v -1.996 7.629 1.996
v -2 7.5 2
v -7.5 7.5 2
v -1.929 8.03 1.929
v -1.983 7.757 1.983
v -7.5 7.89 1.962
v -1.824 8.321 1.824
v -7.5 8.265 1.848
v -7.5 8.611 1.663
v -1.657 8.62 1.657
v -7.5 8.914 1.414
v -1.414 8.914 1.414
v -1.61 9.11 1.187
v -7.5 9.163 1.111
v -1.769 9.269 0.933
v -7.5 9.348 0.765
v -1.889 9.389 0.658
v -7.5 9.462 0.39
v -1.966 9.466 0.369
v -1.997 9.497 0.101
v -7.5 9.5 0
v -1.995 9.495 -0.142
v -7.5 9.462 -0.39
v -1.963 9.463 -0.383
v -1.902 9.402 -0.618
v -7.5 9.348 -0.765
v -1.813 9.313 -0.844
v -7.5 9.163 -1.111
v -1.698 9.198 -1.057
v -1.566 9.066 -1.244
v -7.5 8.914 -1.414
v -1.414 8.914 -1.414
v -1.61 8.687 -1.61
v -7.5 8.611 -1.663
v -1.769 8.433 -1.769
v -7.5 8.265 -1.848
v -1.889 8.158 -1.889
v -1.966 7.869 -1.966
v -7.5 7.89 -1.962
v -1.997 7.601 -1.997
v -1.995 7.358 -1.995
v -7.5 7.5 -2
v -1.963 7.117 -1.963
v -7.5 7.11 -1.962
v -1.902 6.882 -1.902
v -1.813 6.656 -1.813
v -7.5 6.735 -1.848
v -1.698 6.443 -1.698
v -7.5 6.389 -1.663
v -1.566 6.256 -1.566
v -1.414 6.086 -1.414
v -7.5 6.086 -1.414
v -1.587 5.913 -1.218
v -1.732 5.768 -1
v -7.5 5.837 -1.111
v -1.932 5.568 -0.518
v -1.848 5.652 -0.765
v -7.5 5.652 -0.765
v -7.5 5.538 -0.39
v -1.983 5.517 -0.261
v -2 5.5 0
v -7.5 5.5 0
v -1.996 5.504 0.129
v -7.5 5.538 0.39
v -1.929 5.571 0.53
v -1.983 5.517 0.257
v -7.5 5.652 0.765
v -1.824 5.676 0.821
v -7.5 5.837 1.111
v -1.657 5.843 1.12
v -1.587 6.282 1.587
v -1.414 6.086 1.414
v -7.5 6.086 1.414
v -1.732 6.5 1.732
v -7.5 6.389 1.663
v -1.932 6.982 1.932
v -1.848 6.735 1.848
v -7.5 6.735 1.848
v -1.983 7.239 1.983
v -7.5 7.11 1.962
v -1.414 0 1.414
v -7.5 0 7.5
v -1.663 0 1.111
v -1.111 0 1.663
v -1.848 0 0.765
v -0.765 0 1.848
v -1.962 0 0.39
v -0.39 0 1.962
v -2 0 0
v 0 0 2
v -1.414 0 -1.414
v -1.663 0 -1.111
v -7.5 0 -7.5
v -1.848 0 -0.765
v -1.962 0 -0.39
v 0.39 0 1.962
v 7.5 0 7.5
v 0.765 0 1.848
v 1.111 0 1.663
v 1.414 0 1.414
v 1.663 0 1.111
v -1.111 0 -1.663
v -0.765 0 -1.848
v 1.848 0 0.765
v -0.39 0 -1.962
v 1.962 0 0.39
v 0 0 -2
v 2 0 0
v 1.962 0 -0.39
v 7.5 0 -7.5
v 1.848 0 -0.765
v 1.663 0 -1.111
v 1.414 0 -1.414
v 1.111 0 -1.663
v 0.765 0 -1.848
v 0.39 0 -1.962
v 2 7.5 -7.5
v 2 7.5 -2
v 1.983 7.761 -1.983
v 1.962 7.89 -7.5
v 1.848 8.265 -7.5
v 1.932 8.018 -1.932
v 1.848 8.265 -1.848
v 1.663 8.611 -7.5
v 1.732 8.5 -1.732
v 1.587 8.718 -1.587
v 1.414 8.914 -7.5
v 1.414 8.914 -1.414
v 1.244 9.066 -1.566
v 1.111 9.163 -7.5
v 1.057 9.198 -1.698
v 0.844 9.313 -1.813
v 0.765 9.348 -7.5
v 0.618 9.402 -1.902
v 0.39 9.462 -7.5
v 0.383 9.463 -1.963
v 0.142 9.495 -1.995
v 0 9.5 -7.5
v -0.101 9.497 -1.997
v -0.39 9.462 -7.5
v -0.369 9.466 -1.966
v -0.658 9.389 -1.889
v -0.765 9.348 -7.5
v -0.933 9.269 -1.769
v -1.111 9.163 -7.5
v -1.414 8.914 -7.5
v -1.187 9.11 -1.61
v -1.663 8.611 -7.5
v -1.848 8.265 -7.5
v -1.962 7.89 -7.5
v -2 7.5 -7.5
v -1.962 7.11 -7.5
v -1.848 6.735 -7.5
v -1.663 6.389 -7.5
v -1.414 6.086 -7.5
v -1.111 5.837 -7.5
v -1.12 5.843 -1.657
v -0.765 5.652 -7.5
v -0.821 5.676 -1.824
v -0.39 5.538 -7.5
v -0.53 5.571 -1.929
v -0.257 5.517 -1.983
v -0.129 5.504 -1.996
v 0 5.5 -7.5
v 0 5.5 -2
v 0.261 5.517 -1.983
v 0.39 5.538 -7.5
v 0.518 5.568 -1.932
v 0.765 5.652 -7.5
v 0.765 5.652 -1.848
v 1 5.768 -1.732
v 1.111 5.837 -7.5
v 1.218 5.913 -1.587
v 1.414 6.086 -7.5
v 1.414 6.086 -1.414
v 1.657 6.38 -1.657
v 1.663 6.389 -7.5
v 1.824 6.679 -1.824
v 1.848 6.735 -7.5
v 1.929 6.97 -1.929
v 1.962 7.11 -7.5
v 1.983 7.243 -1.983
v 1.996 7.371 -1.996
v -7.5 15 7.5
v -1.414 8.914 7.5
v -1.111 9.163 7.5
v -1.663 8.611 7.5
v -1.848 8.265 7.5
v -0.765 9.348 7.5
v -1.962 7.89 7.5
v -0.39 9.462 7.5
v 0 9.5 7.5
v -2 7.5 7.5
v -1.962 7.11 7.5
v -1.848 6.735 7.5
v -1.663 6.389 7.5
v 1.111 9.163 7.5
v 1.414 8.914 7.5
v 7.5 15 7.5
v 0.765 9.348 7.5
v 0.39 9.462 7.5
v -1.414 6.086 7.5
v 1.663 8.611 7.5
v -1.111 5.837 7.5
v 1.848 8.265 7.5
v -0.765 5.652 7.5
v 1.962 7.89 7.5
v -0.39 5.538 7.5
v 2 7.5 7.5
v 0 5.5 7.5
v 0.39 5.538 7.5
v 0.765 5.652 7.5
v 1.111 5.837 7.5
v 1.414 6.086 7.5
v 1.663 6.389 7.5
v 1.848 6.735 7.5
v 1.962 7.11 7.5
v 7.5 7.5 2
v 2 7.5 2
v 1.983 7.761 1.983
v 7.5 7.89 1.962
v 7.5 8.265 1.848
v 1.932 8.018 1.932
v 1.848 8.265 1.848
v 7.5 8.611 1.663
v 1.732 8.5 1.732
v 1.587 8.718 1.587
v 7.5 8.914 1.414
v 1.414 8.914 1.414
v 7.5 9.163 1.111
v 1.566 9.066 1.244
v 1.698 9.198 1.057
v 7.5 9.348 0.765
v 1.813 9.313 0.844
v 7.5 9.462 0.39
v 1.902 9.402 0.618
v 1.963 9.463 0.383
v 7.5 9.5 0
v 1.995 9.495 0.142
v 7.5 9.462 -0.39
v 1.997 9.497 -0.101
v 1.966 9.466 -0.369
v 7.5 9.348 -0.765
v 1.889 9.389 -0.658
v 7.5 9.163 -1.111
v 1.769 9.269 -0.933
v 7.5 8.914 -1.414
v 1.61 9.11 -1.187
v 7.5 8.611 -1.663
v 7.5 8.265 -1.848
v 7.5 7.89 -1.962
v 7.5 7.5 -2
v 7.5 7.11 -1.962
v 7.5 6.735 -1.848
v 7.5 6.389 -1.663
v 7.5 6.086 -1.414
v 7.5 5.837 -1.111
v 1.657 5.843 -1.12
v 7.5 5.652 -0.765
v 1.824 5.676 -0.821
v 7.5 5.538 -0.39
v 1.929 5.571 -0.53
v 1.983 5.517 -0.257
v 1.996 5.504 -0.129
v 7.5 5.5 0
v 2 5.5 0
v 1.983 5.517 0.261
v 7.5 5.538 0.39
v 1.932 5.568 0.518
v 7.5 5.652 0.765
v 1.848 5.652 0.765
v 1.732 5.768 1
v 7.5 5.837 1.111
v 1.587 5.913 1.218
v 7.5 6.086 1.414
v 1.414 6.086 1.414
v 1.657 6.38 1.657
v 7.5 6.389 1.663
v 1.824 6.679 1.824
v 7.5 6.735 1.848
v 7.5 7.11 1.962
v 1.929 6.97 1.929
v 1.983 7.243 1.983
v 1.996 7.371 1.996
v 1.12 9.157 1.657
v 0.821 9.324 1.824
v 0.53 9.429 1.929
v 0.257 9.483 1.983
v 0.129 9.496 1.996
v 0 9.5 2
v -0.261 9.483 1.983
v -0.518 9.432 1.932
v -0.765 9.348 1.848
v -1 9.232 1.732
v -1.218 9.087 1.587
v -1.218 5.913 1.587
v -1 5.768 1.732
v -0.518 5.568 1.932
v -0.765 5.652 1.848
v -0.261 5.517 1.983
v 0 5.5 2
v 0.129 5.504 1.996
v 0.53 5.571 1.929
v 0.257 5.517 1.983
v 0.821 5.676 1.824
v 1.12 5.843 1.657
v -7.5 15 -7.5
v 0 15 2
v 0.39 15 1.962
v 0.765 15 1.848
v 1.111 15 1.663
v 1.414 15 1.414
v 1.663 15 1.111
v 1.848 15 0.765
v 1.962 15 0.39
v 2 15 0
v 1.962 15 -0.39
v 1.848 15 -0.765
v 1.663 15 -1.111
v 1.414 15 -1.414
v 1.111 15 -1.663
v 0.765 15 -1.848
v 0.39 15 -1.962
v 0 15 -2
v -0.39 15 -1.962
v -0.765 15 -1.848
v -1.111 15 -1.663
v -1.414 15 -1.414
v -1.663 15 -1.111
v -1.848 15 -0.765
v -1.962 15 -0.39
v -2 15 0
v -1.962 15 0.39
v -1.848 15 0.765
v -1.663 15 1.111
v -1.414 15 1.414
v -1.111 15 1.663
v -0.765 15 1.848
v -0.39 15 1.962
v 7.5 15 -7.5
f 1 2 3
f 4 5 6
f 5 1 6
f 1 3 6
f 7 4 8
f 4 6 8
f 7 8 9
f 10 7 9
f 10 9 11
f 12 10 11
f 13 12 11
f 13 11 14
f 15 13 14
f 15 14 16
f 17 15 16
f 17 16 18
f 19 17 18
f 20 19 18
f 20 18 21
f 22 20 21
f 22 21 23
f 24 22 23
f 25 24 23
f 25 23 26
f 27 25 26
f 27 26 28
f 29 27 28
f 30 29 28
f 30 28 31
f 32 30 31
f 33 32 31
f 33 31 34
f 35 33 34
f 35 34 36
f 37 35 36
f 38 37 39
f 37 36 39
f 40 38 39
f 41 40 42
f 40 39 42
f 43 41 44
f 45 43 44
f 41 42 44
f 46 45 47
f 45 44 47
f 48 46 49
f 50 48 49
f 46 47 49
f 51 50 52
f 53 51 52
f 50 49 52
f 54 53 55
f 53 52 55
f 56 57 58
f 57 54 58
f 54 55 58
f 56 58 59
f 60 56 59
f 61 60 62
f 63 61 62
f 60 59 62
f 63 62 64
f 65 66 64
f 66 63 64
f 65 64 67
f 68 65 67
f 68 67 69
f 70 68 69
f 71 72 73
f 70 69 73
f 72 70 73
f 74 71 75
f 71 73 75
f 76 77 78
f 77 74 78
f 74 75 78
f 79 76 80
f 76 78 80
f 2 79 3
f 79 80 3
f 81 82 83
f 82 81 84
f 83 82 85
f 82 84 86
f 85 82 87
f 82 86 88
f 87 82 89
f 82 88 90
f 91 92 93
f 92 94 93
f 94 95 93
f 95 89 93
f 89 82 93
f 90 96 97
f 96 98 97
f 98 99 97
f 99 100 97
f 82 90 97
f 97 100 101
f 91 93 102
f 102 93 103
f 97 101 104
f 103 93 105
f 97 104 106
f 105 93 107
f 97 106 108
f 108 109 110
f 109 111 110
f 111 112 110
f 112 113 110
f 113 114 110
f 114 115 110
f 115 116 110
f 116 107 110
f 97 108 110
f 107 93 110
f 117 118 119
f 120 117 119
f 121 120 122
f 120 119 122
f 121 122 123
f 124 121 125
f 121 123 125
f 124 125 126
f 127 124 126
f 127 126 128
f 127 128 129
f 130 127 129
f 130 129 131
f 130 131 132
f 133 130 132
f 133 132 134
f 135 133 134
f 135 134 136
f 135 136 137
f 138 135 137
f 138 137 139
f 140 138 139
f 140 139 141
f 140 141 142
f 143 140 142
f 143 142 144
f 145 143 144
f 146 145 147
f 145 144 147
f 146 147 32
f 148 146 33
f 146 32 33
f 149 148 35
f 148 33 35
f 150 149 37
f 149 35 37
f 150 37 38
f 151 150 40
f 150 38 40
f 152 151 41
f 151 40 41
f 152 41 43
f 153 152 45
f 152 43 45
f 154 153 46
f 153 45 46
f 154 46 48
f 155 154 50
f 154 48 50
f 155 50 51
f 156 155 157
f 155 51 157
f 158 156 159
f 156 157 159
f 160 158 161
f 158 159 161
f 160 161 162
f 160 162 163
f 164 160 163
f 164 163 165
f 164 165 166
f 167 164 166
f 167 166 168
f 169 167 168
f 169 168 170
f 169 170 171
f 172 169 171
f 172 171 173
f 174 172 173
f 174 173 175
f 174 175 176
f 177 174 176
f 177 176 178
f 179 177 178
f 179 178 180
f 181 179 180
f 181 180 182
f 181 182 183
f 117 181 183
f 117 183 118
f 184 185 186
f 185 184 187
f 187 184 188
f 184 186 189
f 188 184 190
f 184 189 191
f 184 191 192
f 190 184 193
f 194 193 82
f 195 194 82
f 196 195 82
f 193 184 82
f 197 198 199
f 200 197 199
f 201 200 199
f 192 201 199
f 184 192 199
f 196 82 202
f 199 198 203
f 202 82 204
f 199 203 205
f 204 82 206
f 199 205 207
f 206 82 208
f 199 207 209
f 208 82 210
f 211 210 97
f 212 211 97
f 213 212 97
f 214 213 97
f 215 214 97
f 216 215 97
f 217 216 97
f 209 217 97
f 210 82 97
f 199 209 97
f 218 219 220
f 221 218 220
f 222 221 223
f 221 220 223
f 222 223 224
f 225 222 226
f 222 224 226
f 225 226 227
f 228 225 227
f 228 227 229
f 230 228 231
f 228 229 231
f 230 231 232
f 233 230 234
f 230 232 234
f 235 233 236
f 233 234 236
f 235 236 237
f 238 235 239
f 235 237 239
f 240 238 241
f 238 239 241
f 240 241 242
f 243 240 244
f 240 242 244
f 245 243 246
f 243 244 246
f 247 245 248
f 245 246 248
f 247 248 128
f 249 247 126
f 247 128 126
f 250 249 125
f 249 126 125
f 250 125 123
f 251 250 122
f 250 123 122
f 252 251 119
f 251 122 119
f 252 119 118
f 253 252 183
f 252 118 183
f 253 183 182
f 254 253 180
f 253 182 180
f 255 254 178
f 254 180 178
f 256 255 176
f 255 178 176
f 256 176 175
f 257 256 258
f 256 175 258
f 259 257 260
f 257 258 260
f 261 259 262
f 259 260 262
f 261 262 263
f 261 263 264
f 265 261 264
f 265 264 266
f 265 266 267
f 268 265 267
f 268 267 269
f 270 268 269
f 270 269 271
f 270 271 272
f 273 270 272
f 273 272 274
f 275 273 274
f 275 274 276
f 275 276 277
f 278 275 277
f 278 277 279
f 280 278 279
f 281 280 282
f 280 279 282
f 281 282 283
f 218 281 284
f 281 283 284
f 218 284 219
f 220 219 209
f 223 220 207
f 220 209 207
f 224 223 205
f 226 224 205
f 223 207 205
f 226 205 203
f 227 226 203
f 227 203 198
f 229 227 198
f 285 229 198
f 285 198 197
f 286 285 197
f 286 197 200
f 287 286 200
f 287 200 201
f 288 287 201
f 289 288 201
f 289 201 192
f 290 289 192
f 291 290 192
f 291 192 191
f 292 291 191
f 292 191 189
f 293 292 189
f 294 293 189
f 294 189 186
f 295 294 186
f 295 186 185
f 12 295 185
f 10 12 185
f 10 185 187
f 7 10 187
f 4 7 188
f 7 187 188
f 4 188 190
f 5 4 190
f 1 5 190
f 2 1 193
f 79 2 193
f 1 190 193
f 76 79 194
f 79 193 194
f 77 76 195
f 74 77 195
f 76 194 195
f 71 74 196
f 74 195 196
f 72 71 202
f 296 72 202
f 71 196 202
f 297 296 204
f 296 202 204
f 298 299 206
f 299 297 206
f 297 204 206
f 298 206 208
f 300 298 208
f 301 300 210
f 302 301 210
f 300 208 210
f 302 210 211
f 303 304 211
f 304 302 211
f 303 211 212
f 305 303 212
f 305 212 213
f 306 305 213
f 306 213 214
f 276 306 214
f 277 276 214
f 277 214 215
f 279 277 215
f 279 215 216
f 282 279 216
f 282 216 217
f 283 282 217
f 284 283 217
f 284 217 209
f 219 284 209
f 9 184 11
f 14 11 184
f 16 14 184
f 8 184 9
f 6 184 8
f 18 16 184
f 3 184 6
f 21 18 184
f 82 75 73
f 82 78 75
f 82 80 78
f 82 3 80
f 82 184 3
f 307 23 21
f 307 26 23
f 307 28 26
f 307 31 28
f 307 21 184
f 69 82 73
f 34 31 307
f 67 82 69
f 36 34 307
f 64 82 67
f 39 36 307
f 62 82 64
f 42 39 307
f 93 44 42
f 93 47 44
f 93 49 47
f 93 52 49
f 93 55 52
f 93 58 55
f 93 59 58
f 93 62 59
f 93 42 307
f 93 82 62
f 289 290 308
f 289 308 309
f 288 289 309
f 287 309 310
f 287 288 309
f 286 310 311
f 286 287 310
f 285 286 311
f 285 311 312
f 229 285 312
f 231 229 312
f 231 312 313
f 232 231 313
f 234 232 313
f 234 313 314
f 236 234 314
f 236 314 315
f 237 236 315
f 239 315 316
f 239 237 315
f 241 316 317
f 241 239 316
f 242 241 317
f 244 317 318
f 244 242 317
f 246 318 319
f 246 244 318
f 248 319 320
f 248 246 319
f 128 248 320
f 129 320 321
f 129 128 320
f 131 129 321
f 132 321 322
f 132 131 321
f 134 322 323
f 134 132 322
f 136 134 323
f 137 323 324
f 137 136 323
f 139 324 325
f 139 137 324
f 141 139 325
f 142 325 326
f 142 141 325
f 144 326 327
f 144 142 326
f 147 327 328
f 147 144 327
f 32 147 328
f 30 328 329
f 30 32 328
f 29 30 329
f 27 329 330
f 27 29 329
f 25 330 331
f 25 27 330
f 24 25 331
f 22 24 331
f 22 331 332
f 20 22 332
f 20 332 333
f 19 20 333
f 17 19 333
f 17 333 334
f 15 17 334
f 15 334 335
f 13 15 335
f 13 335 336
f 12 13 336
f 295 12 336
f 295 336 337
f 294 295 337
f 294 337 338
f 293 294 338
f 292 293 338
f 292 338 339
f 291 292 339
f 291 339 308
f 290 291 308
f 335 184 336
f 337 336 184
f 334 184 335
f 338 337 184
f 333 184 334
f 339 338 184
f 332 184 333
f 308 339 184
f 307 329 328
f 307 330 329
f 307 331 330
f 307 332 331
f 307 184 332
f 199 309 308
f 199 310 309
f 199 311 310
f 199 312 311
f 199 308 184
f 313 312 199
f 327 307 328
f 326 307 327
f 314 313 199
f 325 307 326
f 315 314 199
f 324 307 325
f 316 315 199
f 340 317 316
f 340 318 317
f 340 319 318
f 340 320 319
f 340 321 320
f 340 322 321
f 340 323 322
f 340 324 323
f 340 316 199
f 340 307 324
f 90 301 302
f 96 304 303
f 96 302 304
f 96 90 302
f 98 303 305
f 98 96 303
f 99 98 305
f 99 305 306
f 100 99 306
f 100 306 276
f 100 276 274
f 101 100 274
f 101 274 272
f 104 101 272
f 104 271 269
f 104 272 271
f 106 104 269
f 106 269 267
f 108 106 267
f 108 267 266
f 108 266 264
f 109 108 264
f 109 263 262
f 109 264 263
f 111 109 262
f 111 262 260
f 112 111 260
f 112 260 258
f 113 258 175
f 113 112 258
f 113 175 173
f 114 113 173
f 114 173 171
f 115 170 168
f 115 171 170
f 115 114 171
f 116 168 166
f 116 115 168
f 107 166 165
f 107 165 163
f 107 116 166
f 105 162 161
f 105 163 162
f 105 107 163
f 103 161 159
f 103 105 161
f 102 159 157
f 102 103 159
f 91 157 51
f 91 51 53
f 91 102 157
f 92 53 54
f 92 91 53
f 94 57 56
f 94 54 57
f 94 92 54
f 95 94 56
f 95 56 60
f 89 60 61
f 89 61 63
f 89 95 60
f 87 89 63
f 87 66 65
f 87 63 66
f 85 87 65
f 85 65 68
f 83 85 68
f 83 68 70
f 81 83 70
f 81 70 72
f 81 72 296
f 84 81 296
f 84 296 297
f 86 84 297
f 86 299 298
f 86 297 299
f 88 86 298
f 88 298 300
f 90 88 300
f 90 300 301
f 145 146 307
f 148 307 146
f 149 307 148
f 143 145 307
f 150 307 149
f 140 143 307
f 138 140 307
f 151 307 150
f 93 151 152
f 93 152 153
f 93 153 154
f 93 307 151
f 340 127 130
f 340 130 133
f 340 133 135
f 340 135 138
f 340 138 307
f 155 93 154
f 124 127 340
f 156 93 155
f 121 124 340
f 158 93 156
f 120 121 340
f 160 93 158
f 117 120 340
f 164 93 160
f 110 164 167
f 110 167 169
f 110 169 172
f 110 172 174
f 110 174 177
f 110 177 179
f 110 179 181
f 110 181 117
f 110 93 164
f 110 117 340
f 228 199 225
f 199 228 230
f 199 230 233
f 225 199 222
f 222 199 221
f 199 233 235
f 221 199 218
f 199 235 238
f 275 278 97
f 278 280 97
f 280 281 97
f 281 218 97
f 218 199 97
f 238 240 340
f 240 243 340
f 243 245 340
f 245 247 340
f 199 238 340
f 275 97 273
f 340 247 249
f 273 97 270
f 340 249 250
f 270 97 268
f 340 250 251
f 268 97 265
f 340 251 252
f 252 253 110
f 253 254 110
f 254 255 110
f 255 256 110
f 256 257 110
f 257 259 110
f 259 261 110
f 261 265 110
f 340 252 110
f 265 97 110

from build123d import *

# Parameters (mm, degrees)
SKETCH_1_W          = 15
SKETCH_1_H          = 15
SKETCH_1_R          = 2
EXTRUDE_1_DEPTH     = 15
SKETCH_2_R          = 2
CUT_EXTRUDE_1_DEPTH = 15
SKETCH_3_R          = 2
CUT_EXTRUDE_2_DEPTH = 15


with BuildPart() as part:
    # 草图1 → 凸台-拉伸1 (new body)
    with BuildSketch(Plane(origin=(0, 0, 0), x_dir=(1, 0, 0), z_dir=(0, 1, 0))):
        Rectangle(SKETCH_1_W, SKETCH_1_H)
        with Locations(Location((0, 0, 0), (0, 0, 270))):
            Circle(SKETCH_1_R, mode=Mode.SUBTRACT)
    extrude(amount=EXTRUDE_1_DEPTH)

    # 草图2 → 切除-拉伸1 (cut)
    with BuildSketch(Plane.XY.offset(7.5)):
        with Locations((0, 7.5)):
            Circle(SKETCH_2_R)
    extrude(amount=-CUT_EXTRUDE_1_DEPTH, mode=Mode.SUBTRACT)

    # 草图3 → 切除-拉伸2 (cut)
    with BuildSketch(Plane.ZY.offset(7.5)):
        with Locations((0, 7.5)):
            Circle(SKETCH_3_R)
    extrude(amount=-CUT_EXTRUDE_2_DEPTH, mode=Mode.SUBTRACT)


solid = part.part
